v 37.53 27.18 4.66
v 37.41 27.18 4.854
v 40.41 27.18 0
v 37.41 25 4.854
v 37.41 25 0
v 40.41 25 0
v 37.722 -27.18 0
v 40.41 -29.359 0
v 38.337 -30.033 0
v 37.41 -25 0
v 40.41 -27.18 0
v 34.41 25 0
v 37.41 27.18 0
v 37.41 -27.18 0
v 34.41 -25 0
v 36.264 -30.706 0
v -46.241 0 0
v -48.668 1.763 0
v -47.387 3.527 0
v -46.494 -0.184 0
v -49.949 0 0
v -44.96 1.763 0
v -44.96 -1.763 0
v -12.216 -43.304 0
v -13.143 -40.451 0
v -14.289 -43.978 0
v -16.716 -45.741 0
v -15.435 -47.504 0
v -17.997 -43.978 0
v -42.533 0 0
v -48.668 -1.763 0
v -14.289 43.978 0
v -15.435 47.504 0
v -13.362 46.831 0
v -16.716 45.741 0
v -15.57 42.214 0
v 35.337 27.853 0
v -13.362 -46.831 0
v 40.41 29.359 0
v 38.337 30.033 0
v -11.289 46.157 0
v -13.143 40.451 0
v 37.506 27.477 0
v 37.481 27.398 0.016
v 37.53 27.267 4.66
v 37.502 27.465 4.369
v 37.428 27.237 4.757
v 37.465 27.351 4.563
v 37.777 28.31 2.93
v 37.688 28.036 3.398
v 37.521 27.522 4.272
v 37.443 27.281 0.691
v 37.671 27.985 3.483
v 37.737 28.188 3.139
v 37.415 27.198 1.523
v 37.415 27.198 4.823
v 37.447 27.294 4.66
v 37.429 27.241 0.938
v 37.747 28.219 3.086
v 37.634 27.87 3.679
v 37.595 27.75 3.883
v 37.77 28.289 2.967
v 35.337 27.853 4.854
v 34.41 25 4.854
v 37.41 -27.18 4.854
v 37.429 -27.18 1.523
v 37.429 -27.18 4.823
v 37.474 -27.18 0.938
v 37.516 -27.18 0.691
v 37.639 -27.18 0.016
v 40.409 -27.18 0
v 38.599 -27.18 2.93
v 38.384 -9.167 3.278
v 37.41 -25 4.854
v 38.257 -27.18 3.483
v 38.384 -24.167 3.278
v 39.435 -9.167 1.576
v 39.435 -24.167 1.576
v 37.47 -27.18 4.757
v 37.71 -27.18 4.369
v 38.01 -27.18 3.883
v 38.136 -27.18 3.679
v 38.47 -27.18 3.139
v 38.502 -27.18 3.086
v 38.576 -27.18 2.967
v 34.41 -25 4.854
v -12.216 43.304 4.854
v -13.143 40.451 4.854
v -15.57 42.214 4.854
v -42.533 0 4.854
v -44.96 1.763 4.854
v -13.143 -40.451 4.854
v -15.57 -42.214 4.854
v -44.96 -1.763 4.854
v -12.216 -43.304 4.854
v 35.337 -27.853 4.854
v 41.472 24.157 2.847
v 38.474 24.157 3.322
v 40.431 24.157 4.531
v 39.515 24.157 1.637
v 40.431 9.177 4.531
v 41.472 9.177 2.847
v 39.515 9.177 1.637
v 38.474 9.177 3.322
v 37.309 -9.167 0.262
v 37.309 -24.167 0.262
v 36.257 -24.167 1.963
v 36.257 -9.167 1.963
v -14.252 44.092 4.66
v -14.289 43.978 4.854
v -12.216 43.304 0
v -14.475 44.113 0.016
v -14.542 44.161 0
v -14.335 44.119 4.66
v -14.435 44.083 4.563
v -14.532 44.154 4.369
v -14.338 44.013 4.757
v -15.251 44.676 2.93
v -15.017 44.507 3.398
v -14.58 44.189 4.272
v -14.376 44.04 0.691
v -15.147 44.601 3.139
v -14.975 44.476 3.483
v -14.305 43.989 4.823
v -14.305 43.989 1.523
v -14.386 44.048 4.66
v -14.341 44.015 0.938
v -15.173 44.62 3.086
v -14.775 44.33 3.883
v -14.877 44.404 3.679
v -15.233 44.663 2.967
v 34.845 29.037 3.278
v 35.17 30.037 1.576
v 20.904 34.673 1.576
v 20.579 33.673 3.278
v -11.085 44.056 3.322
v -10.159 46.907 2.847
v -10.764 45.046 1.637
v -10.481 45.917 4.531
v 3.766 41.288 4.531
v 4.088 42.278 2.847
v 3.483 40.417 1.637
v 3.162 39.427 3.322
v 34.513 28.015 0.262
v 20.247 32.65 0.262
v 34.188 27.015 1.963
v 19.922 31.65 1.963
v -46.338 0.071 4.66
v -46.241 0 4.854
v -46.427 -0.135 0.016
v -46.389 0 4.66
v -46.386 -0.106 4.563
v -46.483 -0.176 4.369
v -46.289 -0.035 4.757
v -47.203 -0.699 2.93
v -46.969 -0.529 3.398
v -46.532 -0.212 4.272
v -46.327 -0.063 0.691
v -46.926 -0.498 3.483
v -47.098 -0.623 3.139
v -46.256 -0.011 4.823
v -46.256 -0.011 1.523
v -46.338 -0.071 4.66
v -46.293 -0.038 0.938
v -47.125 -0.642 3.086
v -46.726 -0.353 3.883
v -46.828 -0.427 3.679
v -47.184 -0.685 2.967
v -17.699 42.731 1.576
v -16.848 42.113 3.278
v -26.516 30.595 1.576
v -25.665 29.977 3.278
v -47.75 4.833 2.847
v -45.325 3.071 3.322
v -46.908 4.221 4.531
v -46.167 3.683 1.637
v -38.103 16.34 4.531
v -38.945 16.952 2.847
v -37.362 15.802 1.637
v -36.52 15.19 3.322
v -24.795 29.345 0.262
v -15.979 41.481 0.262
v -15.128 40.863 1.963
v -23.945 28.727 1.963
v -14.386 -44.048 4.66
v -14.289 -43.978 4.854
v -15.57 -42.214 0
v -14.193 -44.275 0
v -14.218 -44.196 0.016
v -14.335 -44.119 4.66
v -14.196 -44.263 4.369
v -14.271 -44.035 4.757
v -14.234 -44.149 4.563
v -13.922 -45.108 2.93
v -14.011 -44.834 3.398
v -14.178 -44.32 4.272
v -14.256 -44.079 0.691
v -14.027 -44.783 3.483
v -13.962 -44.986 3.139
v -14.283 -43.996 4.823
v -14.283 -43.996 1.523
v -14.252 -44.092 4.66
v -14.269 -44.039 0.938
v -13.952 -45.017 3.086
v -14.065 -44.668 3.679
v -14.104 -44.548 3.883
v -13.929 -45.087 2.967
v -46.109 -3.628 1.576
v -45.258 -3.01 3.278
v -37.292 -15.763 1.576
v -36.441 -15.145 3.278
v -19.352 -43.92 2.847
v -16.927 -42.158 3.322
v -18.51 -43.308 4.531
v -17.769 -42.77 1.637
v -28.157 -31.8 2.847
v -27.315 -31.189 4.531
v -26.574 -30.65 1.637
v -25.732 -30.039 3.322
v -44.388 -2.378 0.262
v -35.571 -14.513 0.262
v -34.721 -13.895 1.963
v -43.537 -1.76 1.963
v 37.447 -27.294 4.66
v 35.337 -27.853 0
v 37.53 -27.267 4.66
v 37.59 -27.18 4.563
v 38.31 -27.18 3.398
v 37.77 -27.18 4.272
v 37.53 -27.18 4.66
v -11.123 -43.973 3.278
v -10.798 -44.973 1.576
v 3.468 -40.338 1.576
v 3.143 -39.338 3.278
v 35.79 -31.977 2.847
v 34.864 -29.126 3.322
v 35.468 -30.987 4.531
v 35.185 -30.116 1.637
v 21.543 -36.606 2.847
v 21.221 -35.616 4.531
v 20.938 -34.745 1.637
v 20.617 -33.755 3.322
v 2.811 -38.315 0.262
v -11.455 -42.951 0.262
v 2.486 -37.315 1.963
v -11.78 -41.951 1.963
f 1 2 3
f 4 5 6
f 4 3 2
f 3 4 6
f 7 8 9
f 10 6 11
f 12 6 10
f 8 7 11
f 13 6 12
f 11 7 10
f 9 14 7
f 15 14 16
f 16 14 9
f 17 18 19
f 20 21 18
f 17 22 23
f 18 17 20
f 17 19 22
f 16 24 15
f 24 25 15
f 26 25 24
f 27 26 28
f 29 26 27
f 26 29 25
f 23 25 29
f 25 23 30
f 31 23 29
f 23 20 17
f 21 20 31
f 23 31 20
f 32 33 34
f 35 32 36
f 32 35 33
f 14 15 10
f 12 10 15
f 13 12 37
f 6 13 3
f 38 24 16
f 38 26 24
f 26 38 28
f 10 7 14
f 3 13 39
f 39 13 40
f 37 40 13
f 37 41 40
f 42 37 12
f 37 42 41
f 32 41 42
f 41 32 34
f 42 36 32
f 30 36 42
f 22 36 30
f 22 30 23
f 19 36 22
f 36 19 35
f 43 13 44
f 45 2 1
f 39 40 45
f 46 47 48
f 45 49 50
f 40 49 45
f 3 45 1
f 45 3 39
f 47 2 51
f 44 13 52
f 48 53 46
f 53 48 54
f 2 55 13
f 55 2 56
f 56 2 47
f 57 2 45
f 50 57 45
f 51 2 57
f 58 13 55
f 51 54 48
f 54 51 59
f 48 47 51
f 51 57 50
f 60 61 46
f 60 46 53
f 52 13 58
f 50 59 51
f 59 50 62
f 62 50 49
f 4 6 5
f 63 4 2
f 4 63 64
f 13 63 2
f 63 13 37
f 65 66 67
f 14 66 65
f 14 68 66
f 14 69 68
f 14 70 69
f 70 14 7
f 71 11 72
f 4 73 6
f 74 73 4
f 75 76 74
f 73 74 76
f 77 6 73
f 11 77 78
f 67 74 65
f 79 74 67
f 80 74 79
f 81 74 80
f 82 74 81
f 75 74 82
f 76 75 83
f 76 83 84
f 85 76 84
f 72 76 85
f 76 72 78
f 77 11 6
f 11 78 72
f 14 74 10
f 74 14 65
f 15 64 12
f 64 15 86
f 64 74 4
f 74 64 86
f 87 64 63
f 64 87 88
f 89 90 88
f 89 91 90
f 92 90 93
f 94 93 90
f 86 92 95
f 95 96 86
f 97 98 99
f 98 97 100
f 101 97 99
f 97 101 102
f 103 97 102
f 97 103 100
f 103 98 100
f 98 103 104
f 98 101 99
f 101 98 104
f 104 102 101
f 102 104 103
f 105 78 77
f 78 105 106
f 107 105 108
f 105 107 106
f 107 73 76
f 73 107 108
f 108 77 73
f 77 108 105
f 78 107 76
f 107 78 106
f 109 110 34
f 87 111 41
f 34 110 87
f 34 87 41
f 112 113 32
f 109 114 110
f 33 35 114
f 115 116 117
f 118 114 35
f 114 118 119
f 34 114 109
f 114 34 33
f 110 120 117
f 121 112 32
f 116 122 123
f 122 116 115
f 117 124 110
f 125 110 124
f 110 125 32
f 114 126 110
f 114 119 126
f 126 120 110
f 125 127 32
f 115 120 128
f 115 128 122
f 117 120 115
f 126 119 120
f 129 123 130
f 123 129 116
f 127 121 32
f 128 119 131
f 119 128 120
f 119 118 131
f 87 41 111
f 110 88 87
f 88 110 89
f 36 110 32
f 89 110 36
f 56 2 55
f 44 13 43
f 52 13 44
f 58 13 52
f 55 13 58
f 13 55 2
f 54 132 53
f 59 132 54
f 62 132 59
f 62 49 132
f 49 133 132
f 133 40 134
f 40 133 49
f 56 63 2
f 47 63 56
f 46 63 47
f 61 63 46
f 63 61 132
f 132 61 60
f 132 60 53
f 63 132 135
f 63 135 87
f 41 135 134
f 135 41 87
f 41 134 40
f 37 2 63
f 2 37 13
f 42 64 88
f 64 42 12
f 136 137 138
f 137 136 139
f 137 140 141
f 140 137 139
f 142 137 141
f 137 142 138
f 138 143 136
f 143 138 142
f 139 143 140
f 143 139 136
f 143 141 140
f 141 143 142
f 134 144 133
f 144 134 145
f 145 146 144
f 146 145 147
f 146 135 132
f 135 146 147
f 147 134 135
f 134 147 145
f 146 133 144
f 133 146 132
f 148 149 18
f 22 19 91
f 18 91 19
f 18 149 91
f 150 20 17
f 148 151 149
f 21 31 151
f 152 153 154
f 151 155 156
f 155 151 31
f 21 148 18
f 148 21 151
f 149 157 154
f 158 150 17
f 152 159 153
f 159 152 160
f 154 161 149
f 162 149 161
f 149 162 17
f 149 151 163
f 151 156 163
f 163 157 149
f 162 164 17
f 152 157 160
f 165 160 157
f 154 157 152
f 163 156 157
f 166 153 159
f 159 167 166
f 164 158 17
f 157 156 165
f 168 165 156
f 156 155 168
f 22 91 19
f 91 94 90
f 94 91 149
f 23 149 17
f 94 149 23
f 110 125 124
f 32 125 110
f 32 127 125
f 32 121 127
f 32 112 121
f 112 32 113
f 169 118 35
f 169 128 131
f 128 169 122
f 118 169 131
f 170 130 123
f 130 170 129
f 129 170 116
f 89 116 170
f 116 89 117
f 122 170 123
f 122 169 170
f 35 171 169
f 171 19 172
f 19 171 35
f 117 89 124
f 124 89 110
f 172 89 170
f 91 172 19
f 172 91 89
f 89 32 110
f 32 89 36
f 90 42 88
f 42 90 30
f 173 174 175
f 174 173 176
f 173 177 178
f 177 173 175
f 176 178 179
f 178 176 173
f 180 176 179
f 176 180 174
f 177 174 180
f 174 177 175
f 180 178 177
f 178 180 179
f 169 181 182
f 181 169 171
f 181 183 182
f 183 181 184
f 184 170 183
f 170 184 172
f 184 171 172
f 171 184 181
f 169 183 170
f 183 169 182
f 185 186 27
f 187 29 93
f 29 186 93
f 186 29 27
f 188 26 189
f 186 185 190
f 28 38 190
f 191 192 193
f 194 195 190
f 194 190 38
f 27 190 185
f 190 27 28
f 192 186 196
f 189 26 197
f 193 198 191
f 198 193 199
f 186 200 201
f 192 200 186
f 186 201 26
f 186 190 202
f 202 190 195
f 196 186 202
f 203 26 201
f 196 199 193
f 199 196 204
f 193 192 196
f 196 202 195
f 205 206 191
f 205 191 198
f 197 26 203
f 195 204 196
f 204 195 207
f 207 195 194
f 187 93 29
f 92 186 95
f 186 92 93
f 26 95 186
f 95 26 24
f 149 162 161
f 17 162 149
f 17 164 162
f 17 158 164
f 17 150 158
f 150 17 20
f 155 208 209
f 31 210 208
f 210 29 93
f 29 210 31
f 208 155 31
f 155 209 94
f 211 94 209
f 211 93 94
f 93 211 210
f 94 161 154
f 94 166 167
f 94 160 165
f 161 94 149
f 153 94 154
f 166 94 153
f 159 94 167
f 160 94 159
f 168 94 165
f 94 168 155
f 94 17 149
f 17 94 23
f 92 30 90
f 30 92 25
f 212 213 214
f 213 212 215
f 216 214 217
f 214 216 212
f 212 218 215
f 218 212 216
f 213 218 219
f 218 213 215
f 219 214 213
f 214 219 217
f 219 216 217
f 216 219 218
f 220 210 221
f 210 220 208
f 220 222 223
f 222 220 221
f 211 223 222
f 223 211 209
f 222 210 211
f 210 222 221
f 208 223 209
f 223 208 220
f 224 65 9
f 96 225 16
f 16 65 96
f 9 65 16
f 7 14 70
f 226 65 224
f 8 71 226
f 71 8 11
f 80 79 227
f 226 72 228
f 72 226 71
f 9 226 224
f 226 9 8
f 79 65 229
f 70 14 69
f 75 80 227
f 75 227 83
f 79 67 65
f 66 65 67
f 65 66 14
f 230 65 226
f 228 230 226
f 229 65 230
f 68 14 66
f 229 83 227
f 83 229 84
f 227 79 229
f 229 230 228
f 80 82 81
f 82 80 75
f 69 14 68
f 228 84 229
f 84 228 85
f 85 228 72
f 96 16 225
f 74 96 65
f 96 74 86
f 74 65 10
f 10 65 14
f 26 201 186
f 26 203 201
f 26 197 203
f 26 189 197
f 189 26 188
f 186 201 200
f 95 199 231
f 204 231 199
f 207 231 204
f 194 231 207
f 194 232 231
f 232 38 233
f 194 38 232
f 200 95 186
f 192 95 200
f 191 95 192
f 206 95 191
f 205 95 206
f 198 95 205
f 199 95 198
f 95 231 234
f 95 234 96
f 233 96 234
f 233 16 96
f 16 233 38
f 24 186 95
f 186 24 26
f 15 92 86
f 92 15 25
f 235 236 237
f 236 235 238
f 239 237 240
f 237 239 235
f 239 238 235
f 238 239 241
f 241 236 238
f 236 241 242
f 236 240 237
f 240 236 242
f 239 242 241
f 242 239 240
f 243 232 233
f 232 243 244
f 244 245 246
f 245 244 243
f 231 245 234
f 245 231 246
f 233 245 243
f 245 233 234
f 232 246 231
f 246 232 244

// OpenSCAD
// Uni-face; you need more of these to form a pythagoran solid
//           uncomment a proper combination of dihedralAngle
//           and ribCount
// fjkraan@electrickery.nl, 2022-01-16
// Pegs added by R. Bost - 2022

// LICENSE: CC Attribution 4.0 International

ribLength = 50;
ribWidth  = 3; // this looks better for the higher dihedralAngle values
//ribWidth  = 6; //suitable for tetrahedron and cube
//dihedralAngle = acos(1/3); // 70.5;   // tetrahedron
//dihedralAngle = acos(0); // 90;     // cube
//dihedralAngle = acos(-1/3); // 109.5;  // octahedron     
dihedralAngle = acos(-1/sqrt(5)); // 116.6;  // dodecahedron   
//dihedralAngle = acos(-sqrt(5)/3); // 138.2;  // icosahedron    
//ribCount  = 3;  // tetrahedron, octahedron, icosahedron
//ribCount  = 4;  // cube
ribCount  = 5;   // dodecahedron
extraWidth = 3;
ribAngle  = 360 / ribCount;
ribHeight = ribWidth * tan(dihedralAngle / 2);
innerCircleRadius = ribLength / (2 * tan(180/ribCount));

hypothenus = ribWidth/cos(dihedralAngle / 2);

pegWidth = 15;
pegDepth = 2.5;
pegHeight = 2;
pegOffset = ribLength/3;
depthTolerance = 0.1;
widthTolerance = 0.01;

module bar(width, height, length) {
    p1 = [0, 0];
    p2 = [width+extraWidth, 0];
    p3 = [extraWidth, height];
    p4 = [0, height];
    rotate([90, 0, 0])
        linear_extrude(length, slices = 50) polygon([p1, p2, p3, p4]);
}

module corner(width,height, angle)
{
    y_offset = (extraWidth) * (tan(ribAngle / 2));
    cornerMiddle(extraWidth, ribHeight, ribAngle);     
    translate([extraWidth,-ribLength, 0]) {
        corner_side(ribWidth,ribHeight,y_offset);
    }
    translate([extraWidth,y_offset, 0]) {
        corner_side(ribWidth,ribHeight,y_offset);
        cornerBit(ribWidth, ribHeight, ribAngle);
    }   
}


module cornerBit(width, height, angle) {
    totalWidth = width+extraWidth;
  p1 = [0, 0];
  p2 = [width, 0];
  p3 = [width, width * (tan(angle / 2))];
  p4 = [width * (cos(angle)) , width * (sin(angle))];
    
  linear_extrude(height, slices = 50, scale = 0) polygon([p1, p2, p3,p4]); 
}

module cornerMiddle(width, height, angle) {
  p1 = [0, 0];
  p2 = [width, 0];
  p3 = [width, width * (tan(angle / 2))];
  p4 = [width * (cos(angle)) , width * (sin(angle))];
    
  linear_extrude(height, slices = 50) polygon([p1, p2, p3,p4]); 
}
module corner_side(width, height, length) {
    p1 = [0, 0];
    p2 = [width, 0];
    p3 = [0, height];
    p4 = [0, height];
    rotate([90, 0, 0])
        linear_extrude(length, slices = 50) polygon([p1, p2, p3, p4]);
}

module peg(wTolerance,hTolerance,dTolerance)
{
    cube(size = [pegHeight-2*hTolerance,pegWidth-2*wTolerance,pegDepth-2*dTolerance], center = true);
}

for (f = [0 : 1 : ribCount - 1]) {
//for (f = [0 : 1 : 0]) {
    angle = ribAngle * f;
    
    rotate([0, 0, angle]){
        difference(){
        union(){
        translate([innerCircleRadius, ribLength / 2, 0]) {
            bar(ribWidth, ribHeight, ribLength);
            corner(extraWidth, ribHeight, ribAngle);
            
        }
        translate([innerCircleRadius+ribWidth+extraWidth, 0, 0]) {
            rotate([0,dihedralAngle/2,0]){
            translate([-hypothenus/2,pegOffset,pegDepth/2]){
                peg(widthTolerance,widthTolerance,depthTolerance);
            }
            }
        }
        }
    translate([innerCircleRadius+ribWidth+extraWidth, 0, 0]) {
            rotate([0,dihedralAngle/2,0]){
            translate([-hypothenus/2,-pegOffset,-pegDepth/2]){
                peg(0,0,0);
            }
            }
        }
        }
    }
}
